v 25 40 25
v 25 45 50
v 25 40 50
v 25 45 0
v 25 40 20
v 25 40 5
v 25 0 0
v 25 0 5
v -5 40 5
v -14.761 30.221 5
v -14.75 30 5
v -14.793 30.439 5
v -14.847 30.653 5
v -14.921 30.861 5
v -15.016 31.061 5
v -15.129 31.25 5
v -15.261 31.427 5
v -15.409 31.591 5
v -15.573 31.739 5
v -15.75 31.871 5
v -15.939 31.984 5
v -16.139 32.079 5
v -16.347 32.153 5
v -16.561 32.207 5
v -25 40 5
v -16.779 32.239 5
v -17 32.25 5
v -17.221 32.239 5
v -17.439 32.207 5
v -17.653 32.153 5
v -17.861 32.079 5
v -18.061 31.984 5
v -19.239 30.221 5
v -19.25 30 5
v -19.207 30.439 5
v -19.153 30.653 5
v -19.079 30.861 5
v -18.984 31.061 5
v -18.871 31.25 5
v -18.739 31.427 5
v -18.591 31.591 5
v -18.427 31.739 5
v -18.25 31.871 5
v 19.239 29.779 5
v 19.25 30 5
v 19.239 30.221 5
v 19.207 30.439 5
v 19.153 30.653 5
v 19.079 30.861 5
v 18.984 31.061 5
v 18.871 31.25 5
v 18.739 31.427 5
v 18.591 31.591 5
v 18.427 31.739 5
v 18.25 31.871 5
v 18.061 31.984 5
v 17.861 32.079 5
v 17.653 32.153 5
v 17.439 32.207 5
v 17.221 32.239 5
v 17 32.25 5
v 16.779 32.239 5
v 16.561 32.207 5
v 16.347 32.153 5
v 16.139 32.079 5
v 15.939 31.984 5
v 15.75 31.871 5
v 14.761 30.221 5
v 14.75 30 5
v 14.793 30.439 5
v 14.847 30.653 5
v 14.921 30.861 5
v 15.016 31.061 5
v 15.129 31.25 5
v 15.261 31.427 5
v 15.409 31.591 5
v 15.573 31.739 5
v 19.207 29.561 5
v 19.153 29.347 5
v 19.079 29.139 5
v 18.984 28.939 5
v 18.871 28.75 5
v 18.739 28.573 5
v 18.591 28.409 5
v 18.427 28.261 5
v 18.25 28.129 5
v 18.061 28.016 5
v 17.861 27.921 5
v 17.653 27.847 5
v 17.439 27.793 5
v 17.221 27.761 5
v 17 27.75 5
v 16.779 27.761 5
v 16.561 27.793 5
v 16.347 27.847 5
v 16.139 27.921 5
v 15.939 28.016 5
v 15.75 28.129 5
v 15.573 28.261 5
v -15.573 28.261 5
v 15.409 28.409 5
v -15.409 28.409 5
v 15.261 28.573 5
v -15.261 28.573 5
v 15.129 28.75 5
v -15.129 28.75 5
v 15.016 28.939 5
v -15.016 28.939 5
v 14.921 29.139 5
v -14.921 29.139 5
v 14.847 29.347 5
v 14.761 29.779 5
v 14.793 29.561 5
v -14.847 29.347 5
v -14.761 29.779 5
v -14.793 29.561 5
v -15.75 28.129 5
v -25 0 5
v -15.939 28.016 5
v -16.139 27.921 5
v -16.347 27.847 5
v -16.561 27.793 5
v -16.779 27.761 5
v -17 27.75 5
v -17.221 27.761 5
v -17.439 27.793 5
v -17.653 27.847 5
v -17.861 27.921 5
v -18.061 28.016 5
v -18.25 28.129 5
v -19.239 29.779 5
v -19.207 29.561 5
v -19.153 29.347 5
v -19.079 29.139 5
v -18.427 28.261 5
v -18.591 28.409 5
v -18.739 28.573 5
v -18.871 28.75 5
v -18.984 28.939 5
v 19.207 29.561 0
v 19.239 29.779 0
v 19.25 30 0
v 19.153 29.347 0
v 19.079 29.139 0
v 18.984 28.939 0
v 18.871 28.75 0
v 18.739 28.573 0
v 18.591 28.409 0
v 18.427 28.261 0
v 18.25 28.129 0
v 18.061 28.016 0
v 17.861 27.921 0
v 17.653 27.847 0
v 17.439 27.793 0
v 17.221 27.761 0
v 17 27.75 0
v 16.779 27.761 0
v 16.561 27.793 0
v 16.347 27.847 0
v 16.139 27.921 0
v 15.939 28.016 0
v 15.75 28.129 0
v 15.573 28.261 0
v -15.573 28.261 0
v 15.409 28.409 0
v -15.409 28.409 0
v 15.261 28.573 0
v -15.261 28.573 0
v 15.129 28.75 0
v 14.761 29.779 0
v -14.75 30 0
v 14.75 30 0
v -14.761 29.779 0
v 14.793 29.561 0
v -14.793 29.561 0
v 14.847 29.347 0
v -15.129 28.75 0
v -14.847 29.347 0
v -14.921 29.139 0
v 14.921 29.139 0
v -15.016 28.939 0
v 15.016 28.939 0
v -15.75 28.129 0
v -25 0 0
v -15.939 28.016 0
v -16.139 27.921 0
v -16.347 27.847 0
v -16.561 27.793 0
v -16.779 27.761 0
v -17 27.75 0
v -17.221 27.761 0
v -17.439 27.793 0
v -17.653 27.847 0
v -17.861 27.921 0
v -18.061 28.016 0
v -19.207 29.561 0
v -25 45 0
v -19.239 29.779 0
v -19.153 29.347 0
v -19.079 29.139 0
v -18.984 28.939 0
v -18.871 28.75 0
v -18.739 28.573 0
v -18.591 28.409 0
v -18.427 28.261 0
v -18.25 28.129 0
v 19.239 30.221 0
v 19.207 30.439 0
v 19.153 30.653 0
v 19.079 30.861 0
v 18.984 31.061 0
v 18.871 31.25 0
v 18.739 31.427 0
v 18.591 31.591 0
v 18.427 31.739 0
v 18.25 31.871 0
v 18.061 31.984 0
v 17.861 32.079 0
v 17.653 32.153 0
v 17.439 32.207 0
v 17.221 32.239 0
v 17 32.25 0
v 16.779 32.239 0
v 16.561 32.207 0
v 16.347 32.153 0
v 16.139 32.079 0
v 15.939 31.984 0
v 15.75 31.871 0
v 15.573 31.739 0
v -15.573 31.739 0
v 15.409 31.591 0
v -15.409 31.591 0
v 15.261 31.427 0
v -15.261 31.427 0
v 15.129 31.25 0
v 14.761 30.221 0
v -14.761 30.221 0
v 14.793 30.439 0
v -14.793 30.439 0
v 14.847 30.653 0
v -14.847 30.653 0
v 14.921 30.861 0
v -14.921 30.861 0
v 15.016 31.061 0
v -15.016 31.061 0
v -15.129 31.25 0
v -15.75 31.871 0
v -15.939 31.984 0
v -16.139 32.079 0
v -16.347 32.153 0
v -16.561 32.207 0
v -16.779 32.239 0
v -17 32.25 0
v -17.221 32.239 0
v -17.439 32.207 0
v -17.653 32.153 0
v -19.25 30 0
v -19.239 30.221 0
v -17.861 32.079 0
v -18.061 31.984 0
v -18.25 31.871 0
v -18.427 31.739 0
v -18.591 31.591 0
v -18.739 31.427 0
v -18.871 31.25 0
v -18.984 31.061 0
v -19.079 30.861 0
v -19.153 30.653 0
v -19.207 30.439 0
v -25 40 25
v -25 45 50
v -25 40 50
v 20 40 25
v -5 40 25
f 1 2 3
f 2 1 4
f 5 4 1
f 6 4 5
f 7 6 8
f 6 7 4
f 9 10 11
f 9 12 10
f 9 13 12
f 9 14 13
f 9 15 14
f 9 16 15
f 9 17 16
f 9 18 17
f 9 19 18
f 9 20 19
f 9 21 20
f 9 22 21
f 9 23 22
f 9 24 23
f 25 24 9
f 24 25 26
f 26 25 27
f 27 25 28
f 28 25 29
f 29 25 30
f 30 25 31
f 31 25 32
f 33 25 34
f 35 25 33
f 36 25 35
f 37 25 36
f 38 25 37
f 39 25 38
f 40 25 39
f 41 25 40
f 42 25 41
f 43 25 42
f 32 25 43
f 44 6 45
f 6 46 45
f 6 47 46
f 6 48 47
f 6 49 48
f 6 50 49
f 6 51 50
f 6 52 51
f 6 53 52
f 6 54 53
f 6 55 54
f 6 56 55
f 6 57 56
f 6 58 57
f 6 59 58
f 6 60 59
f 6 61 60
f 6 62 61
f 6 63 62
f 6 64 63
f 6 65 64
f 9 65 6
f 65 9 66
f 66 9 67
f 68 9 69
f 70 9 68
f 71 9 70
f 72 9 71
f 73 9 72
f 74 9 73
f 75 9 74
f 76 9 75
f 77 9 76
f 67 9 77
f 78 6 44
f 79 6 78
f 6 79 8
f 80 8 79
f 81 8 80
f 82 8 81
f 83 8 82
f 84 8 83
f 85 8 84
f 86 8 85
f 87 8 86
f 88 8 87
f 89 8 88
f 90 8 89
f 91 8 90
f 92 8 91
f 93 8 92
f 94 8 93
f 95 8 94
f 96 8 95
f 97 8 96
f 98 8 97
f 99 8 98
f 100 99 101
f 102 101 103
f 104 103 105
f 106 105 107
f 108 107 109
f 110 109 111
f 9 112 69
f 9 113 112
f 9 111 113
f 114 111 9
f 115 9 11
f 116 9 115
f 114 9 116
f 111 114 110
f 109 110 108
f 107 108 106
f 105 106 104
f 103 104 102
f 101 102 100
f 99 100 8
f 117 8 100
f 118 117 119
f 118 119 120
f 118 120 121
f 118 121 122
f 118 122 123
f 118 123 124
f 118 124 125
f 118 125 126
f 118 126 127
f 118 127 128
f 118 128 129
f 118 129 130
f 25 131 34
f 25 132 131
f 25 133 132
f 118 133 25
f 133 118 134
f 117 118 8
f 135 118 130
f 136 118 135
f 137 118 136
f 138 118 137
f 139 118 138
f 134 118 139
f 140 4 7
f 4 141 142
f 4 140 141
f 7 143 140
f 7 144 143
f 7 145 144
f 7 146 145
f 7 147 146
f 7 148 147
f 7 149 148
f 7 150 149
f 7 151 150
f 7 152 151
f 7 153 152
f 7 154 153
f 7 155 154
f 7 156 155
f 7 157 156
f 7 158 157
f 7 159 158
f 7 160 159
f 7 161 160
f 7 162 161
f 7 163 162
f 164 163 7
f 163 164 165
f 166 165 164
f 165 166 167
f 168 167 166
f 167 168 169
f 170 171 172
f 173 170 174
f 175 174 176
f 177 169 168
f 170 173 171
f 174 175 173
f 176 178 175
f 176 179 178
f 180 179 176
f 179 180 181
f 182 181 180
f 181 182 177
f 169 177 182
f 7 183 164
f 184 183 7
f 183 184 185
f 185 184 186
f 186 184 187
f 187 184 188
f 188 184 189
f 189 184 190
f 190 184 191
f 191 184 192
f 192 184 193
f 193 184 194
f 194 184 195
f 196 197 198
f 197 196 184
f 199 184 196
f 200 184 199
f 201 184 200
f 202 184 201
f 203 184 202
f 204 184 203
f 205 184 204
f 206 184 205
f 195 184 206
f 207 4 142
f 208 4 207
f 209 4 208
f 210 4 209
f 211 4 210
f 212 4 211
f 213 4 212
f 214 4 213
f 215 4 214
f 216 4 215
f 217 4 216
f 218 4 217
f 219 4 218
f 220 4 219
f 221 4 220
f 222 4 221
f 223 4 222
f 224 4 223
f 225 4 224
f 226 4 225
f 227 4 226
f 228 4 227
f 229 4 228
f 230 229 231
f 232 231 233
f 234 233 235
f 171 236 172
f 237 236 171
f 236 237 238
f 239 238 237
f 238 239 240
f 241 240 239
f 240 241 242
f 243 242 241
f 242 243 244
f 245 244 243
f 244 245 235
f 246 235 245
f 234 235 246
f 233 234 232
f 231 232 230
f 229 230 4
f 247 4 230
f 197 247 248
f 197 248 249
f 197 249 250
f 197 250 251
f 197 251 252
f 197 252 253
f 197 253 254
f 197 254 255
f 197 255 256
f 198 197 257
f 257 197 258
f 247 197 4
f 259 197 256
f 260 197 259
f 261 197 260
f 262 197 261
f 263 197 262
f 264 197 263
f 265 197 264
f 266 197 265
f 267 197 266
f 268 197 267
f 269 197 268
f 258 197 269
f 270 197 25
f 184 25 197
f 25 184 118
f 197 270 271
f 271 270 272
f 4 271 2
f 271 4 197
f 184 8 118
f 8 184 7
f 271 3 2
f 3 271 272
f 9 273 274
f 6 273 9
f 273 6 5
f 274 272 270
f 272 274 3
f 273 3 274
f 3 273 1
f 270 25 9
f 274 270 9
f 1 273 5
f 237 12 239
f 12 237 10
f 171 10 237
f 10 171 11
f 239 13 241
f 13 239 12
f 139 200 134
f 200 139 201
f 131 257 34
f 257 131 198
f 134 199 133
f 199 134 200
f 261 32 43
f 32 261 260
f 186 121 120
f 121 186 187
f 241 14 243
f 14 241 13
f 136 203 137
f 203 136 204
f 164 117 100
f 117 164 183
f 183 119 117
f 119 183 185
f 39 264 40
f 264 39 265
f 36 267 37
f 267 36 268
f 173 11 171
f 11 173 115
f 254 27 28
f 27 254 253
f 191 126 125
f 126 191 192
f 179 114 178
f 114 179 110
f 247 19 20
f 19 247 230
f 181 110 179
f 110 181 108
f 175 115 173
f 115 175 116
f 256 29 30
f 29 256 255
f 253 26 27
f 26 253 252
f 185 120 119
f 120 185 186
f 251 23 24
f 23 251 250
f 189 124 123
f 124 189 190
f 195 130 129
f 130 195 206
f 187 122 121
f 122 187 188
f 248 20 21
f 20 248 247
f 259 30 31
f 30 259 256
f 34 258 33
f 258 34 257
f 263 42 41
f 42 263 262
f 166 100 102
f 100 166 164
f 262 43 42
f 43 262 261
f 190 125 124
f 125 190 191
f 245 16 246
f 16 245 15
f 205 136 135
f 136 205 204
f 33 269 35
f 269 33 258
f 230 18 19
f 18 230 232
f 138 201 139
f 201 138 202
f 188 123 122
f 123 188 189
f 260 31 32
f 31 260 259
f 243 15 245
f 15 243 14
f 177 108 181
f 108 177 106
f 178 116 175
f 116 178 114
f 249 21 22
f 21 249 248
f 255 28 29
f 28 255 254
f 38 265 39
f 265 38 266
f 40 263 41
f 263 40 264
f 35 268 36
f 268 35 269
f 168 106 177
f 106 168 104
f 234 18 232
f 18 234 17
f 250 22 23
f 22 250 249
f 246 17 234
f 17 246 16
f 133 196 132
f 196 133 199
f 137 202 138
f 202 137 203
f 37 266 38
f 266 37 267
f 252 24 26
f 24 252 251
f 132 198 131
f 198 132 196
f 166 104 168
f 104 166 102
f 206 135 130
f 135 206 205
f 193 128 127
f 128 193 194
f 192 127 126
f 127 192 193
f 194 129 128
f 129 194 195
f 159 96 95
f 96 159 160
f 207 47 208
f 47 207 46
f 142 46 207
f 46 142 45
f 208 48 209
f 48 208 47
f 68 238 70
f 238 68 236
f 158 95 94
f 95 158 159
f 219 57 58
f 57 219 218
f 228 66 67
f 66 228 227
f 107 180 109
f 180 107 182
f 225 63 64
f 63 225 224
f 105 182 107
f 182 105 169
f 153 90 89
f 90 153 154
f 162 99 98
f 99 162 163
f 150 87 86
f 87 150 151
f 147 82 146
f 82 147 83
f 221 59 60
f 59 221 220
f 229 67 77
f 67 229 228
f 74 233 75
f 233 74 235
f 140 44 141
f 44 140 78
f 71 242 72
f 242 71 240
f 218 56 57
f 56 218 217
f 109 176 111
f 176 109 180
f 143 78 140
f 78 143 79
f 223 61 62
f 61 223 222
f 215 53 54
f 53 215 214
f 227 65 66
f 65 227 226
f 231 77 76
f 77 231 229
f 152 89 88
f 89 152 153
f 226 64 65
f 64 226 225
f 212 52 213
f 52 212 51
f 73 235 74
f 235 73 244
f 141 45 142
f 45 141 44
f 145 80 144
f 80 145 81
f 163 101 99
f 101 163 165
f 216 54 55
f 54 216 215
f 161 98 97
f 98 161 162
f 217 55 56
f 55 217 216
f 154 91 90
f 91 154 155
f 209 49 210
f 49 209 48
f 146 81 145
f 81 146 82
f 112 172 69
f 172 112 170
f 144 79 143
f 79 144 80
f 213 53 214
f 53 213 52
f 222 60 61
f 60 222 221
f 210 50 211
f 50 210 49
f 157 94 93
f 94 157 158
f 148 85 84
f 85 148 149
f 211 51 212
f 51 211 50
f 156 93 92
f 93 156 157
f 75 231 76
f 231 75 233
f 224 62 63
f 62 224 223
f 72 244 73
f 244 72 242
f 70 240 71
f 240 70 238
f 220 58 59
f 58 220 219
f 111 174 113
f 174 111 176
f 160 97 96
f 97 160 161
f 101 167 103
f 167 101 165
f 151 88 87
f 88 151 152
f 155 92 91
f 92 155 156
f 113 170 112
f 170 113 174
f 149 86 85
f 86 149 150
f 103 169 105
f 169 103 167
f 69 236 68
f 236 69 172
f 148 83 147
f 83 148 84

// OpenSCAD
// L-shaped mounting bracket for NEMA 17 stepper motor
// Print orientation: base plate on bed (z = 0), vertical plate builds upward (+Z)

// ---------------- Parameters ----------------
plate_x       = 25;    // base plate half-width (X)
plate_y       = 45;    // base plate length (Y)
plate_t       = 5;     // base plate thickness (Z)

motor_h       = 50;    // vertical motor plate height (Z)
motor_w       = 5;     // vertical plate thickness (Y)

boss_d        = 23;    // motor centring boss hole diameter
boss_x        = 0;     // boss hole X position
boss_z        = 28;    // boss hole Z position

screw_d       = 3.4;   // M3 screw hole diameter
screw_pattern = 31;    // square pitch of screw holes
screw_count   = 4;     // number of screw holes

gusset_t      = 5;     // gusset thickness (X)
gusset_leg    = 20;    // right-triangle leg length (Y and Z)
gusset_x      = [-25, 20]; // gusset X start positions (left and right)

eps           = 0.5;   // cutter overshoot past faces
$fn           = 96;    // curve resolution

// ---------------- Model ----------------
difference() {
    union() {
        // Base plate
        translate([-plate_x, 0, 0])
            cube([plate_x * 2, plate_y, plate_t]);

        // Vertical motor plate
        translate([-plate_x, plate_y - motor_w, 0])
            cube([plate_x * 2, motor_w, motor_h]);
    }

    // Base plate through-holes (M4)
    for (h = [plate_t, plate_t + eps])
        for (sx = [-17, 17], sy = [30])
            translate([sx, sy, 0])
                cylinder(d = 4.5, h = h, $fn = 64);

    // Motor boss hole (along Y) and screw holes
    translate([boss_x, plate_y - motor_w - eps, boss_z])
        rotate([90, 0, 0]) {
            cylinder(d = boss_d, h = motor_w + 2 * eps, $fn = 96);
            for (i = [0 : screw_count - 1])
                for (j = [0 : screw_count - 1])
                    translate([(i - (screw_count - 1) / 2) * screw_pattern,
                               (j - (screw_count - 1) / 2) * screw_pattern,
                               0])
                        cylinder(d = screw_d, h = motor_w + 2 * eps, $fn = 64);
        }

    // Triangular gussets, flush with outer edges
    for (gx = gusset_x)
        translate([gx, plate_y - gusset_t, 5])
            rotate([90, 0, 0])
                linear_extrude(height = gusset_t)
                    polygon(points = [
                        [gusset_leg, gusset_leg],
                        [gusset_leg, 0],
                        [0, gusset_leg]
                    ]);
}
